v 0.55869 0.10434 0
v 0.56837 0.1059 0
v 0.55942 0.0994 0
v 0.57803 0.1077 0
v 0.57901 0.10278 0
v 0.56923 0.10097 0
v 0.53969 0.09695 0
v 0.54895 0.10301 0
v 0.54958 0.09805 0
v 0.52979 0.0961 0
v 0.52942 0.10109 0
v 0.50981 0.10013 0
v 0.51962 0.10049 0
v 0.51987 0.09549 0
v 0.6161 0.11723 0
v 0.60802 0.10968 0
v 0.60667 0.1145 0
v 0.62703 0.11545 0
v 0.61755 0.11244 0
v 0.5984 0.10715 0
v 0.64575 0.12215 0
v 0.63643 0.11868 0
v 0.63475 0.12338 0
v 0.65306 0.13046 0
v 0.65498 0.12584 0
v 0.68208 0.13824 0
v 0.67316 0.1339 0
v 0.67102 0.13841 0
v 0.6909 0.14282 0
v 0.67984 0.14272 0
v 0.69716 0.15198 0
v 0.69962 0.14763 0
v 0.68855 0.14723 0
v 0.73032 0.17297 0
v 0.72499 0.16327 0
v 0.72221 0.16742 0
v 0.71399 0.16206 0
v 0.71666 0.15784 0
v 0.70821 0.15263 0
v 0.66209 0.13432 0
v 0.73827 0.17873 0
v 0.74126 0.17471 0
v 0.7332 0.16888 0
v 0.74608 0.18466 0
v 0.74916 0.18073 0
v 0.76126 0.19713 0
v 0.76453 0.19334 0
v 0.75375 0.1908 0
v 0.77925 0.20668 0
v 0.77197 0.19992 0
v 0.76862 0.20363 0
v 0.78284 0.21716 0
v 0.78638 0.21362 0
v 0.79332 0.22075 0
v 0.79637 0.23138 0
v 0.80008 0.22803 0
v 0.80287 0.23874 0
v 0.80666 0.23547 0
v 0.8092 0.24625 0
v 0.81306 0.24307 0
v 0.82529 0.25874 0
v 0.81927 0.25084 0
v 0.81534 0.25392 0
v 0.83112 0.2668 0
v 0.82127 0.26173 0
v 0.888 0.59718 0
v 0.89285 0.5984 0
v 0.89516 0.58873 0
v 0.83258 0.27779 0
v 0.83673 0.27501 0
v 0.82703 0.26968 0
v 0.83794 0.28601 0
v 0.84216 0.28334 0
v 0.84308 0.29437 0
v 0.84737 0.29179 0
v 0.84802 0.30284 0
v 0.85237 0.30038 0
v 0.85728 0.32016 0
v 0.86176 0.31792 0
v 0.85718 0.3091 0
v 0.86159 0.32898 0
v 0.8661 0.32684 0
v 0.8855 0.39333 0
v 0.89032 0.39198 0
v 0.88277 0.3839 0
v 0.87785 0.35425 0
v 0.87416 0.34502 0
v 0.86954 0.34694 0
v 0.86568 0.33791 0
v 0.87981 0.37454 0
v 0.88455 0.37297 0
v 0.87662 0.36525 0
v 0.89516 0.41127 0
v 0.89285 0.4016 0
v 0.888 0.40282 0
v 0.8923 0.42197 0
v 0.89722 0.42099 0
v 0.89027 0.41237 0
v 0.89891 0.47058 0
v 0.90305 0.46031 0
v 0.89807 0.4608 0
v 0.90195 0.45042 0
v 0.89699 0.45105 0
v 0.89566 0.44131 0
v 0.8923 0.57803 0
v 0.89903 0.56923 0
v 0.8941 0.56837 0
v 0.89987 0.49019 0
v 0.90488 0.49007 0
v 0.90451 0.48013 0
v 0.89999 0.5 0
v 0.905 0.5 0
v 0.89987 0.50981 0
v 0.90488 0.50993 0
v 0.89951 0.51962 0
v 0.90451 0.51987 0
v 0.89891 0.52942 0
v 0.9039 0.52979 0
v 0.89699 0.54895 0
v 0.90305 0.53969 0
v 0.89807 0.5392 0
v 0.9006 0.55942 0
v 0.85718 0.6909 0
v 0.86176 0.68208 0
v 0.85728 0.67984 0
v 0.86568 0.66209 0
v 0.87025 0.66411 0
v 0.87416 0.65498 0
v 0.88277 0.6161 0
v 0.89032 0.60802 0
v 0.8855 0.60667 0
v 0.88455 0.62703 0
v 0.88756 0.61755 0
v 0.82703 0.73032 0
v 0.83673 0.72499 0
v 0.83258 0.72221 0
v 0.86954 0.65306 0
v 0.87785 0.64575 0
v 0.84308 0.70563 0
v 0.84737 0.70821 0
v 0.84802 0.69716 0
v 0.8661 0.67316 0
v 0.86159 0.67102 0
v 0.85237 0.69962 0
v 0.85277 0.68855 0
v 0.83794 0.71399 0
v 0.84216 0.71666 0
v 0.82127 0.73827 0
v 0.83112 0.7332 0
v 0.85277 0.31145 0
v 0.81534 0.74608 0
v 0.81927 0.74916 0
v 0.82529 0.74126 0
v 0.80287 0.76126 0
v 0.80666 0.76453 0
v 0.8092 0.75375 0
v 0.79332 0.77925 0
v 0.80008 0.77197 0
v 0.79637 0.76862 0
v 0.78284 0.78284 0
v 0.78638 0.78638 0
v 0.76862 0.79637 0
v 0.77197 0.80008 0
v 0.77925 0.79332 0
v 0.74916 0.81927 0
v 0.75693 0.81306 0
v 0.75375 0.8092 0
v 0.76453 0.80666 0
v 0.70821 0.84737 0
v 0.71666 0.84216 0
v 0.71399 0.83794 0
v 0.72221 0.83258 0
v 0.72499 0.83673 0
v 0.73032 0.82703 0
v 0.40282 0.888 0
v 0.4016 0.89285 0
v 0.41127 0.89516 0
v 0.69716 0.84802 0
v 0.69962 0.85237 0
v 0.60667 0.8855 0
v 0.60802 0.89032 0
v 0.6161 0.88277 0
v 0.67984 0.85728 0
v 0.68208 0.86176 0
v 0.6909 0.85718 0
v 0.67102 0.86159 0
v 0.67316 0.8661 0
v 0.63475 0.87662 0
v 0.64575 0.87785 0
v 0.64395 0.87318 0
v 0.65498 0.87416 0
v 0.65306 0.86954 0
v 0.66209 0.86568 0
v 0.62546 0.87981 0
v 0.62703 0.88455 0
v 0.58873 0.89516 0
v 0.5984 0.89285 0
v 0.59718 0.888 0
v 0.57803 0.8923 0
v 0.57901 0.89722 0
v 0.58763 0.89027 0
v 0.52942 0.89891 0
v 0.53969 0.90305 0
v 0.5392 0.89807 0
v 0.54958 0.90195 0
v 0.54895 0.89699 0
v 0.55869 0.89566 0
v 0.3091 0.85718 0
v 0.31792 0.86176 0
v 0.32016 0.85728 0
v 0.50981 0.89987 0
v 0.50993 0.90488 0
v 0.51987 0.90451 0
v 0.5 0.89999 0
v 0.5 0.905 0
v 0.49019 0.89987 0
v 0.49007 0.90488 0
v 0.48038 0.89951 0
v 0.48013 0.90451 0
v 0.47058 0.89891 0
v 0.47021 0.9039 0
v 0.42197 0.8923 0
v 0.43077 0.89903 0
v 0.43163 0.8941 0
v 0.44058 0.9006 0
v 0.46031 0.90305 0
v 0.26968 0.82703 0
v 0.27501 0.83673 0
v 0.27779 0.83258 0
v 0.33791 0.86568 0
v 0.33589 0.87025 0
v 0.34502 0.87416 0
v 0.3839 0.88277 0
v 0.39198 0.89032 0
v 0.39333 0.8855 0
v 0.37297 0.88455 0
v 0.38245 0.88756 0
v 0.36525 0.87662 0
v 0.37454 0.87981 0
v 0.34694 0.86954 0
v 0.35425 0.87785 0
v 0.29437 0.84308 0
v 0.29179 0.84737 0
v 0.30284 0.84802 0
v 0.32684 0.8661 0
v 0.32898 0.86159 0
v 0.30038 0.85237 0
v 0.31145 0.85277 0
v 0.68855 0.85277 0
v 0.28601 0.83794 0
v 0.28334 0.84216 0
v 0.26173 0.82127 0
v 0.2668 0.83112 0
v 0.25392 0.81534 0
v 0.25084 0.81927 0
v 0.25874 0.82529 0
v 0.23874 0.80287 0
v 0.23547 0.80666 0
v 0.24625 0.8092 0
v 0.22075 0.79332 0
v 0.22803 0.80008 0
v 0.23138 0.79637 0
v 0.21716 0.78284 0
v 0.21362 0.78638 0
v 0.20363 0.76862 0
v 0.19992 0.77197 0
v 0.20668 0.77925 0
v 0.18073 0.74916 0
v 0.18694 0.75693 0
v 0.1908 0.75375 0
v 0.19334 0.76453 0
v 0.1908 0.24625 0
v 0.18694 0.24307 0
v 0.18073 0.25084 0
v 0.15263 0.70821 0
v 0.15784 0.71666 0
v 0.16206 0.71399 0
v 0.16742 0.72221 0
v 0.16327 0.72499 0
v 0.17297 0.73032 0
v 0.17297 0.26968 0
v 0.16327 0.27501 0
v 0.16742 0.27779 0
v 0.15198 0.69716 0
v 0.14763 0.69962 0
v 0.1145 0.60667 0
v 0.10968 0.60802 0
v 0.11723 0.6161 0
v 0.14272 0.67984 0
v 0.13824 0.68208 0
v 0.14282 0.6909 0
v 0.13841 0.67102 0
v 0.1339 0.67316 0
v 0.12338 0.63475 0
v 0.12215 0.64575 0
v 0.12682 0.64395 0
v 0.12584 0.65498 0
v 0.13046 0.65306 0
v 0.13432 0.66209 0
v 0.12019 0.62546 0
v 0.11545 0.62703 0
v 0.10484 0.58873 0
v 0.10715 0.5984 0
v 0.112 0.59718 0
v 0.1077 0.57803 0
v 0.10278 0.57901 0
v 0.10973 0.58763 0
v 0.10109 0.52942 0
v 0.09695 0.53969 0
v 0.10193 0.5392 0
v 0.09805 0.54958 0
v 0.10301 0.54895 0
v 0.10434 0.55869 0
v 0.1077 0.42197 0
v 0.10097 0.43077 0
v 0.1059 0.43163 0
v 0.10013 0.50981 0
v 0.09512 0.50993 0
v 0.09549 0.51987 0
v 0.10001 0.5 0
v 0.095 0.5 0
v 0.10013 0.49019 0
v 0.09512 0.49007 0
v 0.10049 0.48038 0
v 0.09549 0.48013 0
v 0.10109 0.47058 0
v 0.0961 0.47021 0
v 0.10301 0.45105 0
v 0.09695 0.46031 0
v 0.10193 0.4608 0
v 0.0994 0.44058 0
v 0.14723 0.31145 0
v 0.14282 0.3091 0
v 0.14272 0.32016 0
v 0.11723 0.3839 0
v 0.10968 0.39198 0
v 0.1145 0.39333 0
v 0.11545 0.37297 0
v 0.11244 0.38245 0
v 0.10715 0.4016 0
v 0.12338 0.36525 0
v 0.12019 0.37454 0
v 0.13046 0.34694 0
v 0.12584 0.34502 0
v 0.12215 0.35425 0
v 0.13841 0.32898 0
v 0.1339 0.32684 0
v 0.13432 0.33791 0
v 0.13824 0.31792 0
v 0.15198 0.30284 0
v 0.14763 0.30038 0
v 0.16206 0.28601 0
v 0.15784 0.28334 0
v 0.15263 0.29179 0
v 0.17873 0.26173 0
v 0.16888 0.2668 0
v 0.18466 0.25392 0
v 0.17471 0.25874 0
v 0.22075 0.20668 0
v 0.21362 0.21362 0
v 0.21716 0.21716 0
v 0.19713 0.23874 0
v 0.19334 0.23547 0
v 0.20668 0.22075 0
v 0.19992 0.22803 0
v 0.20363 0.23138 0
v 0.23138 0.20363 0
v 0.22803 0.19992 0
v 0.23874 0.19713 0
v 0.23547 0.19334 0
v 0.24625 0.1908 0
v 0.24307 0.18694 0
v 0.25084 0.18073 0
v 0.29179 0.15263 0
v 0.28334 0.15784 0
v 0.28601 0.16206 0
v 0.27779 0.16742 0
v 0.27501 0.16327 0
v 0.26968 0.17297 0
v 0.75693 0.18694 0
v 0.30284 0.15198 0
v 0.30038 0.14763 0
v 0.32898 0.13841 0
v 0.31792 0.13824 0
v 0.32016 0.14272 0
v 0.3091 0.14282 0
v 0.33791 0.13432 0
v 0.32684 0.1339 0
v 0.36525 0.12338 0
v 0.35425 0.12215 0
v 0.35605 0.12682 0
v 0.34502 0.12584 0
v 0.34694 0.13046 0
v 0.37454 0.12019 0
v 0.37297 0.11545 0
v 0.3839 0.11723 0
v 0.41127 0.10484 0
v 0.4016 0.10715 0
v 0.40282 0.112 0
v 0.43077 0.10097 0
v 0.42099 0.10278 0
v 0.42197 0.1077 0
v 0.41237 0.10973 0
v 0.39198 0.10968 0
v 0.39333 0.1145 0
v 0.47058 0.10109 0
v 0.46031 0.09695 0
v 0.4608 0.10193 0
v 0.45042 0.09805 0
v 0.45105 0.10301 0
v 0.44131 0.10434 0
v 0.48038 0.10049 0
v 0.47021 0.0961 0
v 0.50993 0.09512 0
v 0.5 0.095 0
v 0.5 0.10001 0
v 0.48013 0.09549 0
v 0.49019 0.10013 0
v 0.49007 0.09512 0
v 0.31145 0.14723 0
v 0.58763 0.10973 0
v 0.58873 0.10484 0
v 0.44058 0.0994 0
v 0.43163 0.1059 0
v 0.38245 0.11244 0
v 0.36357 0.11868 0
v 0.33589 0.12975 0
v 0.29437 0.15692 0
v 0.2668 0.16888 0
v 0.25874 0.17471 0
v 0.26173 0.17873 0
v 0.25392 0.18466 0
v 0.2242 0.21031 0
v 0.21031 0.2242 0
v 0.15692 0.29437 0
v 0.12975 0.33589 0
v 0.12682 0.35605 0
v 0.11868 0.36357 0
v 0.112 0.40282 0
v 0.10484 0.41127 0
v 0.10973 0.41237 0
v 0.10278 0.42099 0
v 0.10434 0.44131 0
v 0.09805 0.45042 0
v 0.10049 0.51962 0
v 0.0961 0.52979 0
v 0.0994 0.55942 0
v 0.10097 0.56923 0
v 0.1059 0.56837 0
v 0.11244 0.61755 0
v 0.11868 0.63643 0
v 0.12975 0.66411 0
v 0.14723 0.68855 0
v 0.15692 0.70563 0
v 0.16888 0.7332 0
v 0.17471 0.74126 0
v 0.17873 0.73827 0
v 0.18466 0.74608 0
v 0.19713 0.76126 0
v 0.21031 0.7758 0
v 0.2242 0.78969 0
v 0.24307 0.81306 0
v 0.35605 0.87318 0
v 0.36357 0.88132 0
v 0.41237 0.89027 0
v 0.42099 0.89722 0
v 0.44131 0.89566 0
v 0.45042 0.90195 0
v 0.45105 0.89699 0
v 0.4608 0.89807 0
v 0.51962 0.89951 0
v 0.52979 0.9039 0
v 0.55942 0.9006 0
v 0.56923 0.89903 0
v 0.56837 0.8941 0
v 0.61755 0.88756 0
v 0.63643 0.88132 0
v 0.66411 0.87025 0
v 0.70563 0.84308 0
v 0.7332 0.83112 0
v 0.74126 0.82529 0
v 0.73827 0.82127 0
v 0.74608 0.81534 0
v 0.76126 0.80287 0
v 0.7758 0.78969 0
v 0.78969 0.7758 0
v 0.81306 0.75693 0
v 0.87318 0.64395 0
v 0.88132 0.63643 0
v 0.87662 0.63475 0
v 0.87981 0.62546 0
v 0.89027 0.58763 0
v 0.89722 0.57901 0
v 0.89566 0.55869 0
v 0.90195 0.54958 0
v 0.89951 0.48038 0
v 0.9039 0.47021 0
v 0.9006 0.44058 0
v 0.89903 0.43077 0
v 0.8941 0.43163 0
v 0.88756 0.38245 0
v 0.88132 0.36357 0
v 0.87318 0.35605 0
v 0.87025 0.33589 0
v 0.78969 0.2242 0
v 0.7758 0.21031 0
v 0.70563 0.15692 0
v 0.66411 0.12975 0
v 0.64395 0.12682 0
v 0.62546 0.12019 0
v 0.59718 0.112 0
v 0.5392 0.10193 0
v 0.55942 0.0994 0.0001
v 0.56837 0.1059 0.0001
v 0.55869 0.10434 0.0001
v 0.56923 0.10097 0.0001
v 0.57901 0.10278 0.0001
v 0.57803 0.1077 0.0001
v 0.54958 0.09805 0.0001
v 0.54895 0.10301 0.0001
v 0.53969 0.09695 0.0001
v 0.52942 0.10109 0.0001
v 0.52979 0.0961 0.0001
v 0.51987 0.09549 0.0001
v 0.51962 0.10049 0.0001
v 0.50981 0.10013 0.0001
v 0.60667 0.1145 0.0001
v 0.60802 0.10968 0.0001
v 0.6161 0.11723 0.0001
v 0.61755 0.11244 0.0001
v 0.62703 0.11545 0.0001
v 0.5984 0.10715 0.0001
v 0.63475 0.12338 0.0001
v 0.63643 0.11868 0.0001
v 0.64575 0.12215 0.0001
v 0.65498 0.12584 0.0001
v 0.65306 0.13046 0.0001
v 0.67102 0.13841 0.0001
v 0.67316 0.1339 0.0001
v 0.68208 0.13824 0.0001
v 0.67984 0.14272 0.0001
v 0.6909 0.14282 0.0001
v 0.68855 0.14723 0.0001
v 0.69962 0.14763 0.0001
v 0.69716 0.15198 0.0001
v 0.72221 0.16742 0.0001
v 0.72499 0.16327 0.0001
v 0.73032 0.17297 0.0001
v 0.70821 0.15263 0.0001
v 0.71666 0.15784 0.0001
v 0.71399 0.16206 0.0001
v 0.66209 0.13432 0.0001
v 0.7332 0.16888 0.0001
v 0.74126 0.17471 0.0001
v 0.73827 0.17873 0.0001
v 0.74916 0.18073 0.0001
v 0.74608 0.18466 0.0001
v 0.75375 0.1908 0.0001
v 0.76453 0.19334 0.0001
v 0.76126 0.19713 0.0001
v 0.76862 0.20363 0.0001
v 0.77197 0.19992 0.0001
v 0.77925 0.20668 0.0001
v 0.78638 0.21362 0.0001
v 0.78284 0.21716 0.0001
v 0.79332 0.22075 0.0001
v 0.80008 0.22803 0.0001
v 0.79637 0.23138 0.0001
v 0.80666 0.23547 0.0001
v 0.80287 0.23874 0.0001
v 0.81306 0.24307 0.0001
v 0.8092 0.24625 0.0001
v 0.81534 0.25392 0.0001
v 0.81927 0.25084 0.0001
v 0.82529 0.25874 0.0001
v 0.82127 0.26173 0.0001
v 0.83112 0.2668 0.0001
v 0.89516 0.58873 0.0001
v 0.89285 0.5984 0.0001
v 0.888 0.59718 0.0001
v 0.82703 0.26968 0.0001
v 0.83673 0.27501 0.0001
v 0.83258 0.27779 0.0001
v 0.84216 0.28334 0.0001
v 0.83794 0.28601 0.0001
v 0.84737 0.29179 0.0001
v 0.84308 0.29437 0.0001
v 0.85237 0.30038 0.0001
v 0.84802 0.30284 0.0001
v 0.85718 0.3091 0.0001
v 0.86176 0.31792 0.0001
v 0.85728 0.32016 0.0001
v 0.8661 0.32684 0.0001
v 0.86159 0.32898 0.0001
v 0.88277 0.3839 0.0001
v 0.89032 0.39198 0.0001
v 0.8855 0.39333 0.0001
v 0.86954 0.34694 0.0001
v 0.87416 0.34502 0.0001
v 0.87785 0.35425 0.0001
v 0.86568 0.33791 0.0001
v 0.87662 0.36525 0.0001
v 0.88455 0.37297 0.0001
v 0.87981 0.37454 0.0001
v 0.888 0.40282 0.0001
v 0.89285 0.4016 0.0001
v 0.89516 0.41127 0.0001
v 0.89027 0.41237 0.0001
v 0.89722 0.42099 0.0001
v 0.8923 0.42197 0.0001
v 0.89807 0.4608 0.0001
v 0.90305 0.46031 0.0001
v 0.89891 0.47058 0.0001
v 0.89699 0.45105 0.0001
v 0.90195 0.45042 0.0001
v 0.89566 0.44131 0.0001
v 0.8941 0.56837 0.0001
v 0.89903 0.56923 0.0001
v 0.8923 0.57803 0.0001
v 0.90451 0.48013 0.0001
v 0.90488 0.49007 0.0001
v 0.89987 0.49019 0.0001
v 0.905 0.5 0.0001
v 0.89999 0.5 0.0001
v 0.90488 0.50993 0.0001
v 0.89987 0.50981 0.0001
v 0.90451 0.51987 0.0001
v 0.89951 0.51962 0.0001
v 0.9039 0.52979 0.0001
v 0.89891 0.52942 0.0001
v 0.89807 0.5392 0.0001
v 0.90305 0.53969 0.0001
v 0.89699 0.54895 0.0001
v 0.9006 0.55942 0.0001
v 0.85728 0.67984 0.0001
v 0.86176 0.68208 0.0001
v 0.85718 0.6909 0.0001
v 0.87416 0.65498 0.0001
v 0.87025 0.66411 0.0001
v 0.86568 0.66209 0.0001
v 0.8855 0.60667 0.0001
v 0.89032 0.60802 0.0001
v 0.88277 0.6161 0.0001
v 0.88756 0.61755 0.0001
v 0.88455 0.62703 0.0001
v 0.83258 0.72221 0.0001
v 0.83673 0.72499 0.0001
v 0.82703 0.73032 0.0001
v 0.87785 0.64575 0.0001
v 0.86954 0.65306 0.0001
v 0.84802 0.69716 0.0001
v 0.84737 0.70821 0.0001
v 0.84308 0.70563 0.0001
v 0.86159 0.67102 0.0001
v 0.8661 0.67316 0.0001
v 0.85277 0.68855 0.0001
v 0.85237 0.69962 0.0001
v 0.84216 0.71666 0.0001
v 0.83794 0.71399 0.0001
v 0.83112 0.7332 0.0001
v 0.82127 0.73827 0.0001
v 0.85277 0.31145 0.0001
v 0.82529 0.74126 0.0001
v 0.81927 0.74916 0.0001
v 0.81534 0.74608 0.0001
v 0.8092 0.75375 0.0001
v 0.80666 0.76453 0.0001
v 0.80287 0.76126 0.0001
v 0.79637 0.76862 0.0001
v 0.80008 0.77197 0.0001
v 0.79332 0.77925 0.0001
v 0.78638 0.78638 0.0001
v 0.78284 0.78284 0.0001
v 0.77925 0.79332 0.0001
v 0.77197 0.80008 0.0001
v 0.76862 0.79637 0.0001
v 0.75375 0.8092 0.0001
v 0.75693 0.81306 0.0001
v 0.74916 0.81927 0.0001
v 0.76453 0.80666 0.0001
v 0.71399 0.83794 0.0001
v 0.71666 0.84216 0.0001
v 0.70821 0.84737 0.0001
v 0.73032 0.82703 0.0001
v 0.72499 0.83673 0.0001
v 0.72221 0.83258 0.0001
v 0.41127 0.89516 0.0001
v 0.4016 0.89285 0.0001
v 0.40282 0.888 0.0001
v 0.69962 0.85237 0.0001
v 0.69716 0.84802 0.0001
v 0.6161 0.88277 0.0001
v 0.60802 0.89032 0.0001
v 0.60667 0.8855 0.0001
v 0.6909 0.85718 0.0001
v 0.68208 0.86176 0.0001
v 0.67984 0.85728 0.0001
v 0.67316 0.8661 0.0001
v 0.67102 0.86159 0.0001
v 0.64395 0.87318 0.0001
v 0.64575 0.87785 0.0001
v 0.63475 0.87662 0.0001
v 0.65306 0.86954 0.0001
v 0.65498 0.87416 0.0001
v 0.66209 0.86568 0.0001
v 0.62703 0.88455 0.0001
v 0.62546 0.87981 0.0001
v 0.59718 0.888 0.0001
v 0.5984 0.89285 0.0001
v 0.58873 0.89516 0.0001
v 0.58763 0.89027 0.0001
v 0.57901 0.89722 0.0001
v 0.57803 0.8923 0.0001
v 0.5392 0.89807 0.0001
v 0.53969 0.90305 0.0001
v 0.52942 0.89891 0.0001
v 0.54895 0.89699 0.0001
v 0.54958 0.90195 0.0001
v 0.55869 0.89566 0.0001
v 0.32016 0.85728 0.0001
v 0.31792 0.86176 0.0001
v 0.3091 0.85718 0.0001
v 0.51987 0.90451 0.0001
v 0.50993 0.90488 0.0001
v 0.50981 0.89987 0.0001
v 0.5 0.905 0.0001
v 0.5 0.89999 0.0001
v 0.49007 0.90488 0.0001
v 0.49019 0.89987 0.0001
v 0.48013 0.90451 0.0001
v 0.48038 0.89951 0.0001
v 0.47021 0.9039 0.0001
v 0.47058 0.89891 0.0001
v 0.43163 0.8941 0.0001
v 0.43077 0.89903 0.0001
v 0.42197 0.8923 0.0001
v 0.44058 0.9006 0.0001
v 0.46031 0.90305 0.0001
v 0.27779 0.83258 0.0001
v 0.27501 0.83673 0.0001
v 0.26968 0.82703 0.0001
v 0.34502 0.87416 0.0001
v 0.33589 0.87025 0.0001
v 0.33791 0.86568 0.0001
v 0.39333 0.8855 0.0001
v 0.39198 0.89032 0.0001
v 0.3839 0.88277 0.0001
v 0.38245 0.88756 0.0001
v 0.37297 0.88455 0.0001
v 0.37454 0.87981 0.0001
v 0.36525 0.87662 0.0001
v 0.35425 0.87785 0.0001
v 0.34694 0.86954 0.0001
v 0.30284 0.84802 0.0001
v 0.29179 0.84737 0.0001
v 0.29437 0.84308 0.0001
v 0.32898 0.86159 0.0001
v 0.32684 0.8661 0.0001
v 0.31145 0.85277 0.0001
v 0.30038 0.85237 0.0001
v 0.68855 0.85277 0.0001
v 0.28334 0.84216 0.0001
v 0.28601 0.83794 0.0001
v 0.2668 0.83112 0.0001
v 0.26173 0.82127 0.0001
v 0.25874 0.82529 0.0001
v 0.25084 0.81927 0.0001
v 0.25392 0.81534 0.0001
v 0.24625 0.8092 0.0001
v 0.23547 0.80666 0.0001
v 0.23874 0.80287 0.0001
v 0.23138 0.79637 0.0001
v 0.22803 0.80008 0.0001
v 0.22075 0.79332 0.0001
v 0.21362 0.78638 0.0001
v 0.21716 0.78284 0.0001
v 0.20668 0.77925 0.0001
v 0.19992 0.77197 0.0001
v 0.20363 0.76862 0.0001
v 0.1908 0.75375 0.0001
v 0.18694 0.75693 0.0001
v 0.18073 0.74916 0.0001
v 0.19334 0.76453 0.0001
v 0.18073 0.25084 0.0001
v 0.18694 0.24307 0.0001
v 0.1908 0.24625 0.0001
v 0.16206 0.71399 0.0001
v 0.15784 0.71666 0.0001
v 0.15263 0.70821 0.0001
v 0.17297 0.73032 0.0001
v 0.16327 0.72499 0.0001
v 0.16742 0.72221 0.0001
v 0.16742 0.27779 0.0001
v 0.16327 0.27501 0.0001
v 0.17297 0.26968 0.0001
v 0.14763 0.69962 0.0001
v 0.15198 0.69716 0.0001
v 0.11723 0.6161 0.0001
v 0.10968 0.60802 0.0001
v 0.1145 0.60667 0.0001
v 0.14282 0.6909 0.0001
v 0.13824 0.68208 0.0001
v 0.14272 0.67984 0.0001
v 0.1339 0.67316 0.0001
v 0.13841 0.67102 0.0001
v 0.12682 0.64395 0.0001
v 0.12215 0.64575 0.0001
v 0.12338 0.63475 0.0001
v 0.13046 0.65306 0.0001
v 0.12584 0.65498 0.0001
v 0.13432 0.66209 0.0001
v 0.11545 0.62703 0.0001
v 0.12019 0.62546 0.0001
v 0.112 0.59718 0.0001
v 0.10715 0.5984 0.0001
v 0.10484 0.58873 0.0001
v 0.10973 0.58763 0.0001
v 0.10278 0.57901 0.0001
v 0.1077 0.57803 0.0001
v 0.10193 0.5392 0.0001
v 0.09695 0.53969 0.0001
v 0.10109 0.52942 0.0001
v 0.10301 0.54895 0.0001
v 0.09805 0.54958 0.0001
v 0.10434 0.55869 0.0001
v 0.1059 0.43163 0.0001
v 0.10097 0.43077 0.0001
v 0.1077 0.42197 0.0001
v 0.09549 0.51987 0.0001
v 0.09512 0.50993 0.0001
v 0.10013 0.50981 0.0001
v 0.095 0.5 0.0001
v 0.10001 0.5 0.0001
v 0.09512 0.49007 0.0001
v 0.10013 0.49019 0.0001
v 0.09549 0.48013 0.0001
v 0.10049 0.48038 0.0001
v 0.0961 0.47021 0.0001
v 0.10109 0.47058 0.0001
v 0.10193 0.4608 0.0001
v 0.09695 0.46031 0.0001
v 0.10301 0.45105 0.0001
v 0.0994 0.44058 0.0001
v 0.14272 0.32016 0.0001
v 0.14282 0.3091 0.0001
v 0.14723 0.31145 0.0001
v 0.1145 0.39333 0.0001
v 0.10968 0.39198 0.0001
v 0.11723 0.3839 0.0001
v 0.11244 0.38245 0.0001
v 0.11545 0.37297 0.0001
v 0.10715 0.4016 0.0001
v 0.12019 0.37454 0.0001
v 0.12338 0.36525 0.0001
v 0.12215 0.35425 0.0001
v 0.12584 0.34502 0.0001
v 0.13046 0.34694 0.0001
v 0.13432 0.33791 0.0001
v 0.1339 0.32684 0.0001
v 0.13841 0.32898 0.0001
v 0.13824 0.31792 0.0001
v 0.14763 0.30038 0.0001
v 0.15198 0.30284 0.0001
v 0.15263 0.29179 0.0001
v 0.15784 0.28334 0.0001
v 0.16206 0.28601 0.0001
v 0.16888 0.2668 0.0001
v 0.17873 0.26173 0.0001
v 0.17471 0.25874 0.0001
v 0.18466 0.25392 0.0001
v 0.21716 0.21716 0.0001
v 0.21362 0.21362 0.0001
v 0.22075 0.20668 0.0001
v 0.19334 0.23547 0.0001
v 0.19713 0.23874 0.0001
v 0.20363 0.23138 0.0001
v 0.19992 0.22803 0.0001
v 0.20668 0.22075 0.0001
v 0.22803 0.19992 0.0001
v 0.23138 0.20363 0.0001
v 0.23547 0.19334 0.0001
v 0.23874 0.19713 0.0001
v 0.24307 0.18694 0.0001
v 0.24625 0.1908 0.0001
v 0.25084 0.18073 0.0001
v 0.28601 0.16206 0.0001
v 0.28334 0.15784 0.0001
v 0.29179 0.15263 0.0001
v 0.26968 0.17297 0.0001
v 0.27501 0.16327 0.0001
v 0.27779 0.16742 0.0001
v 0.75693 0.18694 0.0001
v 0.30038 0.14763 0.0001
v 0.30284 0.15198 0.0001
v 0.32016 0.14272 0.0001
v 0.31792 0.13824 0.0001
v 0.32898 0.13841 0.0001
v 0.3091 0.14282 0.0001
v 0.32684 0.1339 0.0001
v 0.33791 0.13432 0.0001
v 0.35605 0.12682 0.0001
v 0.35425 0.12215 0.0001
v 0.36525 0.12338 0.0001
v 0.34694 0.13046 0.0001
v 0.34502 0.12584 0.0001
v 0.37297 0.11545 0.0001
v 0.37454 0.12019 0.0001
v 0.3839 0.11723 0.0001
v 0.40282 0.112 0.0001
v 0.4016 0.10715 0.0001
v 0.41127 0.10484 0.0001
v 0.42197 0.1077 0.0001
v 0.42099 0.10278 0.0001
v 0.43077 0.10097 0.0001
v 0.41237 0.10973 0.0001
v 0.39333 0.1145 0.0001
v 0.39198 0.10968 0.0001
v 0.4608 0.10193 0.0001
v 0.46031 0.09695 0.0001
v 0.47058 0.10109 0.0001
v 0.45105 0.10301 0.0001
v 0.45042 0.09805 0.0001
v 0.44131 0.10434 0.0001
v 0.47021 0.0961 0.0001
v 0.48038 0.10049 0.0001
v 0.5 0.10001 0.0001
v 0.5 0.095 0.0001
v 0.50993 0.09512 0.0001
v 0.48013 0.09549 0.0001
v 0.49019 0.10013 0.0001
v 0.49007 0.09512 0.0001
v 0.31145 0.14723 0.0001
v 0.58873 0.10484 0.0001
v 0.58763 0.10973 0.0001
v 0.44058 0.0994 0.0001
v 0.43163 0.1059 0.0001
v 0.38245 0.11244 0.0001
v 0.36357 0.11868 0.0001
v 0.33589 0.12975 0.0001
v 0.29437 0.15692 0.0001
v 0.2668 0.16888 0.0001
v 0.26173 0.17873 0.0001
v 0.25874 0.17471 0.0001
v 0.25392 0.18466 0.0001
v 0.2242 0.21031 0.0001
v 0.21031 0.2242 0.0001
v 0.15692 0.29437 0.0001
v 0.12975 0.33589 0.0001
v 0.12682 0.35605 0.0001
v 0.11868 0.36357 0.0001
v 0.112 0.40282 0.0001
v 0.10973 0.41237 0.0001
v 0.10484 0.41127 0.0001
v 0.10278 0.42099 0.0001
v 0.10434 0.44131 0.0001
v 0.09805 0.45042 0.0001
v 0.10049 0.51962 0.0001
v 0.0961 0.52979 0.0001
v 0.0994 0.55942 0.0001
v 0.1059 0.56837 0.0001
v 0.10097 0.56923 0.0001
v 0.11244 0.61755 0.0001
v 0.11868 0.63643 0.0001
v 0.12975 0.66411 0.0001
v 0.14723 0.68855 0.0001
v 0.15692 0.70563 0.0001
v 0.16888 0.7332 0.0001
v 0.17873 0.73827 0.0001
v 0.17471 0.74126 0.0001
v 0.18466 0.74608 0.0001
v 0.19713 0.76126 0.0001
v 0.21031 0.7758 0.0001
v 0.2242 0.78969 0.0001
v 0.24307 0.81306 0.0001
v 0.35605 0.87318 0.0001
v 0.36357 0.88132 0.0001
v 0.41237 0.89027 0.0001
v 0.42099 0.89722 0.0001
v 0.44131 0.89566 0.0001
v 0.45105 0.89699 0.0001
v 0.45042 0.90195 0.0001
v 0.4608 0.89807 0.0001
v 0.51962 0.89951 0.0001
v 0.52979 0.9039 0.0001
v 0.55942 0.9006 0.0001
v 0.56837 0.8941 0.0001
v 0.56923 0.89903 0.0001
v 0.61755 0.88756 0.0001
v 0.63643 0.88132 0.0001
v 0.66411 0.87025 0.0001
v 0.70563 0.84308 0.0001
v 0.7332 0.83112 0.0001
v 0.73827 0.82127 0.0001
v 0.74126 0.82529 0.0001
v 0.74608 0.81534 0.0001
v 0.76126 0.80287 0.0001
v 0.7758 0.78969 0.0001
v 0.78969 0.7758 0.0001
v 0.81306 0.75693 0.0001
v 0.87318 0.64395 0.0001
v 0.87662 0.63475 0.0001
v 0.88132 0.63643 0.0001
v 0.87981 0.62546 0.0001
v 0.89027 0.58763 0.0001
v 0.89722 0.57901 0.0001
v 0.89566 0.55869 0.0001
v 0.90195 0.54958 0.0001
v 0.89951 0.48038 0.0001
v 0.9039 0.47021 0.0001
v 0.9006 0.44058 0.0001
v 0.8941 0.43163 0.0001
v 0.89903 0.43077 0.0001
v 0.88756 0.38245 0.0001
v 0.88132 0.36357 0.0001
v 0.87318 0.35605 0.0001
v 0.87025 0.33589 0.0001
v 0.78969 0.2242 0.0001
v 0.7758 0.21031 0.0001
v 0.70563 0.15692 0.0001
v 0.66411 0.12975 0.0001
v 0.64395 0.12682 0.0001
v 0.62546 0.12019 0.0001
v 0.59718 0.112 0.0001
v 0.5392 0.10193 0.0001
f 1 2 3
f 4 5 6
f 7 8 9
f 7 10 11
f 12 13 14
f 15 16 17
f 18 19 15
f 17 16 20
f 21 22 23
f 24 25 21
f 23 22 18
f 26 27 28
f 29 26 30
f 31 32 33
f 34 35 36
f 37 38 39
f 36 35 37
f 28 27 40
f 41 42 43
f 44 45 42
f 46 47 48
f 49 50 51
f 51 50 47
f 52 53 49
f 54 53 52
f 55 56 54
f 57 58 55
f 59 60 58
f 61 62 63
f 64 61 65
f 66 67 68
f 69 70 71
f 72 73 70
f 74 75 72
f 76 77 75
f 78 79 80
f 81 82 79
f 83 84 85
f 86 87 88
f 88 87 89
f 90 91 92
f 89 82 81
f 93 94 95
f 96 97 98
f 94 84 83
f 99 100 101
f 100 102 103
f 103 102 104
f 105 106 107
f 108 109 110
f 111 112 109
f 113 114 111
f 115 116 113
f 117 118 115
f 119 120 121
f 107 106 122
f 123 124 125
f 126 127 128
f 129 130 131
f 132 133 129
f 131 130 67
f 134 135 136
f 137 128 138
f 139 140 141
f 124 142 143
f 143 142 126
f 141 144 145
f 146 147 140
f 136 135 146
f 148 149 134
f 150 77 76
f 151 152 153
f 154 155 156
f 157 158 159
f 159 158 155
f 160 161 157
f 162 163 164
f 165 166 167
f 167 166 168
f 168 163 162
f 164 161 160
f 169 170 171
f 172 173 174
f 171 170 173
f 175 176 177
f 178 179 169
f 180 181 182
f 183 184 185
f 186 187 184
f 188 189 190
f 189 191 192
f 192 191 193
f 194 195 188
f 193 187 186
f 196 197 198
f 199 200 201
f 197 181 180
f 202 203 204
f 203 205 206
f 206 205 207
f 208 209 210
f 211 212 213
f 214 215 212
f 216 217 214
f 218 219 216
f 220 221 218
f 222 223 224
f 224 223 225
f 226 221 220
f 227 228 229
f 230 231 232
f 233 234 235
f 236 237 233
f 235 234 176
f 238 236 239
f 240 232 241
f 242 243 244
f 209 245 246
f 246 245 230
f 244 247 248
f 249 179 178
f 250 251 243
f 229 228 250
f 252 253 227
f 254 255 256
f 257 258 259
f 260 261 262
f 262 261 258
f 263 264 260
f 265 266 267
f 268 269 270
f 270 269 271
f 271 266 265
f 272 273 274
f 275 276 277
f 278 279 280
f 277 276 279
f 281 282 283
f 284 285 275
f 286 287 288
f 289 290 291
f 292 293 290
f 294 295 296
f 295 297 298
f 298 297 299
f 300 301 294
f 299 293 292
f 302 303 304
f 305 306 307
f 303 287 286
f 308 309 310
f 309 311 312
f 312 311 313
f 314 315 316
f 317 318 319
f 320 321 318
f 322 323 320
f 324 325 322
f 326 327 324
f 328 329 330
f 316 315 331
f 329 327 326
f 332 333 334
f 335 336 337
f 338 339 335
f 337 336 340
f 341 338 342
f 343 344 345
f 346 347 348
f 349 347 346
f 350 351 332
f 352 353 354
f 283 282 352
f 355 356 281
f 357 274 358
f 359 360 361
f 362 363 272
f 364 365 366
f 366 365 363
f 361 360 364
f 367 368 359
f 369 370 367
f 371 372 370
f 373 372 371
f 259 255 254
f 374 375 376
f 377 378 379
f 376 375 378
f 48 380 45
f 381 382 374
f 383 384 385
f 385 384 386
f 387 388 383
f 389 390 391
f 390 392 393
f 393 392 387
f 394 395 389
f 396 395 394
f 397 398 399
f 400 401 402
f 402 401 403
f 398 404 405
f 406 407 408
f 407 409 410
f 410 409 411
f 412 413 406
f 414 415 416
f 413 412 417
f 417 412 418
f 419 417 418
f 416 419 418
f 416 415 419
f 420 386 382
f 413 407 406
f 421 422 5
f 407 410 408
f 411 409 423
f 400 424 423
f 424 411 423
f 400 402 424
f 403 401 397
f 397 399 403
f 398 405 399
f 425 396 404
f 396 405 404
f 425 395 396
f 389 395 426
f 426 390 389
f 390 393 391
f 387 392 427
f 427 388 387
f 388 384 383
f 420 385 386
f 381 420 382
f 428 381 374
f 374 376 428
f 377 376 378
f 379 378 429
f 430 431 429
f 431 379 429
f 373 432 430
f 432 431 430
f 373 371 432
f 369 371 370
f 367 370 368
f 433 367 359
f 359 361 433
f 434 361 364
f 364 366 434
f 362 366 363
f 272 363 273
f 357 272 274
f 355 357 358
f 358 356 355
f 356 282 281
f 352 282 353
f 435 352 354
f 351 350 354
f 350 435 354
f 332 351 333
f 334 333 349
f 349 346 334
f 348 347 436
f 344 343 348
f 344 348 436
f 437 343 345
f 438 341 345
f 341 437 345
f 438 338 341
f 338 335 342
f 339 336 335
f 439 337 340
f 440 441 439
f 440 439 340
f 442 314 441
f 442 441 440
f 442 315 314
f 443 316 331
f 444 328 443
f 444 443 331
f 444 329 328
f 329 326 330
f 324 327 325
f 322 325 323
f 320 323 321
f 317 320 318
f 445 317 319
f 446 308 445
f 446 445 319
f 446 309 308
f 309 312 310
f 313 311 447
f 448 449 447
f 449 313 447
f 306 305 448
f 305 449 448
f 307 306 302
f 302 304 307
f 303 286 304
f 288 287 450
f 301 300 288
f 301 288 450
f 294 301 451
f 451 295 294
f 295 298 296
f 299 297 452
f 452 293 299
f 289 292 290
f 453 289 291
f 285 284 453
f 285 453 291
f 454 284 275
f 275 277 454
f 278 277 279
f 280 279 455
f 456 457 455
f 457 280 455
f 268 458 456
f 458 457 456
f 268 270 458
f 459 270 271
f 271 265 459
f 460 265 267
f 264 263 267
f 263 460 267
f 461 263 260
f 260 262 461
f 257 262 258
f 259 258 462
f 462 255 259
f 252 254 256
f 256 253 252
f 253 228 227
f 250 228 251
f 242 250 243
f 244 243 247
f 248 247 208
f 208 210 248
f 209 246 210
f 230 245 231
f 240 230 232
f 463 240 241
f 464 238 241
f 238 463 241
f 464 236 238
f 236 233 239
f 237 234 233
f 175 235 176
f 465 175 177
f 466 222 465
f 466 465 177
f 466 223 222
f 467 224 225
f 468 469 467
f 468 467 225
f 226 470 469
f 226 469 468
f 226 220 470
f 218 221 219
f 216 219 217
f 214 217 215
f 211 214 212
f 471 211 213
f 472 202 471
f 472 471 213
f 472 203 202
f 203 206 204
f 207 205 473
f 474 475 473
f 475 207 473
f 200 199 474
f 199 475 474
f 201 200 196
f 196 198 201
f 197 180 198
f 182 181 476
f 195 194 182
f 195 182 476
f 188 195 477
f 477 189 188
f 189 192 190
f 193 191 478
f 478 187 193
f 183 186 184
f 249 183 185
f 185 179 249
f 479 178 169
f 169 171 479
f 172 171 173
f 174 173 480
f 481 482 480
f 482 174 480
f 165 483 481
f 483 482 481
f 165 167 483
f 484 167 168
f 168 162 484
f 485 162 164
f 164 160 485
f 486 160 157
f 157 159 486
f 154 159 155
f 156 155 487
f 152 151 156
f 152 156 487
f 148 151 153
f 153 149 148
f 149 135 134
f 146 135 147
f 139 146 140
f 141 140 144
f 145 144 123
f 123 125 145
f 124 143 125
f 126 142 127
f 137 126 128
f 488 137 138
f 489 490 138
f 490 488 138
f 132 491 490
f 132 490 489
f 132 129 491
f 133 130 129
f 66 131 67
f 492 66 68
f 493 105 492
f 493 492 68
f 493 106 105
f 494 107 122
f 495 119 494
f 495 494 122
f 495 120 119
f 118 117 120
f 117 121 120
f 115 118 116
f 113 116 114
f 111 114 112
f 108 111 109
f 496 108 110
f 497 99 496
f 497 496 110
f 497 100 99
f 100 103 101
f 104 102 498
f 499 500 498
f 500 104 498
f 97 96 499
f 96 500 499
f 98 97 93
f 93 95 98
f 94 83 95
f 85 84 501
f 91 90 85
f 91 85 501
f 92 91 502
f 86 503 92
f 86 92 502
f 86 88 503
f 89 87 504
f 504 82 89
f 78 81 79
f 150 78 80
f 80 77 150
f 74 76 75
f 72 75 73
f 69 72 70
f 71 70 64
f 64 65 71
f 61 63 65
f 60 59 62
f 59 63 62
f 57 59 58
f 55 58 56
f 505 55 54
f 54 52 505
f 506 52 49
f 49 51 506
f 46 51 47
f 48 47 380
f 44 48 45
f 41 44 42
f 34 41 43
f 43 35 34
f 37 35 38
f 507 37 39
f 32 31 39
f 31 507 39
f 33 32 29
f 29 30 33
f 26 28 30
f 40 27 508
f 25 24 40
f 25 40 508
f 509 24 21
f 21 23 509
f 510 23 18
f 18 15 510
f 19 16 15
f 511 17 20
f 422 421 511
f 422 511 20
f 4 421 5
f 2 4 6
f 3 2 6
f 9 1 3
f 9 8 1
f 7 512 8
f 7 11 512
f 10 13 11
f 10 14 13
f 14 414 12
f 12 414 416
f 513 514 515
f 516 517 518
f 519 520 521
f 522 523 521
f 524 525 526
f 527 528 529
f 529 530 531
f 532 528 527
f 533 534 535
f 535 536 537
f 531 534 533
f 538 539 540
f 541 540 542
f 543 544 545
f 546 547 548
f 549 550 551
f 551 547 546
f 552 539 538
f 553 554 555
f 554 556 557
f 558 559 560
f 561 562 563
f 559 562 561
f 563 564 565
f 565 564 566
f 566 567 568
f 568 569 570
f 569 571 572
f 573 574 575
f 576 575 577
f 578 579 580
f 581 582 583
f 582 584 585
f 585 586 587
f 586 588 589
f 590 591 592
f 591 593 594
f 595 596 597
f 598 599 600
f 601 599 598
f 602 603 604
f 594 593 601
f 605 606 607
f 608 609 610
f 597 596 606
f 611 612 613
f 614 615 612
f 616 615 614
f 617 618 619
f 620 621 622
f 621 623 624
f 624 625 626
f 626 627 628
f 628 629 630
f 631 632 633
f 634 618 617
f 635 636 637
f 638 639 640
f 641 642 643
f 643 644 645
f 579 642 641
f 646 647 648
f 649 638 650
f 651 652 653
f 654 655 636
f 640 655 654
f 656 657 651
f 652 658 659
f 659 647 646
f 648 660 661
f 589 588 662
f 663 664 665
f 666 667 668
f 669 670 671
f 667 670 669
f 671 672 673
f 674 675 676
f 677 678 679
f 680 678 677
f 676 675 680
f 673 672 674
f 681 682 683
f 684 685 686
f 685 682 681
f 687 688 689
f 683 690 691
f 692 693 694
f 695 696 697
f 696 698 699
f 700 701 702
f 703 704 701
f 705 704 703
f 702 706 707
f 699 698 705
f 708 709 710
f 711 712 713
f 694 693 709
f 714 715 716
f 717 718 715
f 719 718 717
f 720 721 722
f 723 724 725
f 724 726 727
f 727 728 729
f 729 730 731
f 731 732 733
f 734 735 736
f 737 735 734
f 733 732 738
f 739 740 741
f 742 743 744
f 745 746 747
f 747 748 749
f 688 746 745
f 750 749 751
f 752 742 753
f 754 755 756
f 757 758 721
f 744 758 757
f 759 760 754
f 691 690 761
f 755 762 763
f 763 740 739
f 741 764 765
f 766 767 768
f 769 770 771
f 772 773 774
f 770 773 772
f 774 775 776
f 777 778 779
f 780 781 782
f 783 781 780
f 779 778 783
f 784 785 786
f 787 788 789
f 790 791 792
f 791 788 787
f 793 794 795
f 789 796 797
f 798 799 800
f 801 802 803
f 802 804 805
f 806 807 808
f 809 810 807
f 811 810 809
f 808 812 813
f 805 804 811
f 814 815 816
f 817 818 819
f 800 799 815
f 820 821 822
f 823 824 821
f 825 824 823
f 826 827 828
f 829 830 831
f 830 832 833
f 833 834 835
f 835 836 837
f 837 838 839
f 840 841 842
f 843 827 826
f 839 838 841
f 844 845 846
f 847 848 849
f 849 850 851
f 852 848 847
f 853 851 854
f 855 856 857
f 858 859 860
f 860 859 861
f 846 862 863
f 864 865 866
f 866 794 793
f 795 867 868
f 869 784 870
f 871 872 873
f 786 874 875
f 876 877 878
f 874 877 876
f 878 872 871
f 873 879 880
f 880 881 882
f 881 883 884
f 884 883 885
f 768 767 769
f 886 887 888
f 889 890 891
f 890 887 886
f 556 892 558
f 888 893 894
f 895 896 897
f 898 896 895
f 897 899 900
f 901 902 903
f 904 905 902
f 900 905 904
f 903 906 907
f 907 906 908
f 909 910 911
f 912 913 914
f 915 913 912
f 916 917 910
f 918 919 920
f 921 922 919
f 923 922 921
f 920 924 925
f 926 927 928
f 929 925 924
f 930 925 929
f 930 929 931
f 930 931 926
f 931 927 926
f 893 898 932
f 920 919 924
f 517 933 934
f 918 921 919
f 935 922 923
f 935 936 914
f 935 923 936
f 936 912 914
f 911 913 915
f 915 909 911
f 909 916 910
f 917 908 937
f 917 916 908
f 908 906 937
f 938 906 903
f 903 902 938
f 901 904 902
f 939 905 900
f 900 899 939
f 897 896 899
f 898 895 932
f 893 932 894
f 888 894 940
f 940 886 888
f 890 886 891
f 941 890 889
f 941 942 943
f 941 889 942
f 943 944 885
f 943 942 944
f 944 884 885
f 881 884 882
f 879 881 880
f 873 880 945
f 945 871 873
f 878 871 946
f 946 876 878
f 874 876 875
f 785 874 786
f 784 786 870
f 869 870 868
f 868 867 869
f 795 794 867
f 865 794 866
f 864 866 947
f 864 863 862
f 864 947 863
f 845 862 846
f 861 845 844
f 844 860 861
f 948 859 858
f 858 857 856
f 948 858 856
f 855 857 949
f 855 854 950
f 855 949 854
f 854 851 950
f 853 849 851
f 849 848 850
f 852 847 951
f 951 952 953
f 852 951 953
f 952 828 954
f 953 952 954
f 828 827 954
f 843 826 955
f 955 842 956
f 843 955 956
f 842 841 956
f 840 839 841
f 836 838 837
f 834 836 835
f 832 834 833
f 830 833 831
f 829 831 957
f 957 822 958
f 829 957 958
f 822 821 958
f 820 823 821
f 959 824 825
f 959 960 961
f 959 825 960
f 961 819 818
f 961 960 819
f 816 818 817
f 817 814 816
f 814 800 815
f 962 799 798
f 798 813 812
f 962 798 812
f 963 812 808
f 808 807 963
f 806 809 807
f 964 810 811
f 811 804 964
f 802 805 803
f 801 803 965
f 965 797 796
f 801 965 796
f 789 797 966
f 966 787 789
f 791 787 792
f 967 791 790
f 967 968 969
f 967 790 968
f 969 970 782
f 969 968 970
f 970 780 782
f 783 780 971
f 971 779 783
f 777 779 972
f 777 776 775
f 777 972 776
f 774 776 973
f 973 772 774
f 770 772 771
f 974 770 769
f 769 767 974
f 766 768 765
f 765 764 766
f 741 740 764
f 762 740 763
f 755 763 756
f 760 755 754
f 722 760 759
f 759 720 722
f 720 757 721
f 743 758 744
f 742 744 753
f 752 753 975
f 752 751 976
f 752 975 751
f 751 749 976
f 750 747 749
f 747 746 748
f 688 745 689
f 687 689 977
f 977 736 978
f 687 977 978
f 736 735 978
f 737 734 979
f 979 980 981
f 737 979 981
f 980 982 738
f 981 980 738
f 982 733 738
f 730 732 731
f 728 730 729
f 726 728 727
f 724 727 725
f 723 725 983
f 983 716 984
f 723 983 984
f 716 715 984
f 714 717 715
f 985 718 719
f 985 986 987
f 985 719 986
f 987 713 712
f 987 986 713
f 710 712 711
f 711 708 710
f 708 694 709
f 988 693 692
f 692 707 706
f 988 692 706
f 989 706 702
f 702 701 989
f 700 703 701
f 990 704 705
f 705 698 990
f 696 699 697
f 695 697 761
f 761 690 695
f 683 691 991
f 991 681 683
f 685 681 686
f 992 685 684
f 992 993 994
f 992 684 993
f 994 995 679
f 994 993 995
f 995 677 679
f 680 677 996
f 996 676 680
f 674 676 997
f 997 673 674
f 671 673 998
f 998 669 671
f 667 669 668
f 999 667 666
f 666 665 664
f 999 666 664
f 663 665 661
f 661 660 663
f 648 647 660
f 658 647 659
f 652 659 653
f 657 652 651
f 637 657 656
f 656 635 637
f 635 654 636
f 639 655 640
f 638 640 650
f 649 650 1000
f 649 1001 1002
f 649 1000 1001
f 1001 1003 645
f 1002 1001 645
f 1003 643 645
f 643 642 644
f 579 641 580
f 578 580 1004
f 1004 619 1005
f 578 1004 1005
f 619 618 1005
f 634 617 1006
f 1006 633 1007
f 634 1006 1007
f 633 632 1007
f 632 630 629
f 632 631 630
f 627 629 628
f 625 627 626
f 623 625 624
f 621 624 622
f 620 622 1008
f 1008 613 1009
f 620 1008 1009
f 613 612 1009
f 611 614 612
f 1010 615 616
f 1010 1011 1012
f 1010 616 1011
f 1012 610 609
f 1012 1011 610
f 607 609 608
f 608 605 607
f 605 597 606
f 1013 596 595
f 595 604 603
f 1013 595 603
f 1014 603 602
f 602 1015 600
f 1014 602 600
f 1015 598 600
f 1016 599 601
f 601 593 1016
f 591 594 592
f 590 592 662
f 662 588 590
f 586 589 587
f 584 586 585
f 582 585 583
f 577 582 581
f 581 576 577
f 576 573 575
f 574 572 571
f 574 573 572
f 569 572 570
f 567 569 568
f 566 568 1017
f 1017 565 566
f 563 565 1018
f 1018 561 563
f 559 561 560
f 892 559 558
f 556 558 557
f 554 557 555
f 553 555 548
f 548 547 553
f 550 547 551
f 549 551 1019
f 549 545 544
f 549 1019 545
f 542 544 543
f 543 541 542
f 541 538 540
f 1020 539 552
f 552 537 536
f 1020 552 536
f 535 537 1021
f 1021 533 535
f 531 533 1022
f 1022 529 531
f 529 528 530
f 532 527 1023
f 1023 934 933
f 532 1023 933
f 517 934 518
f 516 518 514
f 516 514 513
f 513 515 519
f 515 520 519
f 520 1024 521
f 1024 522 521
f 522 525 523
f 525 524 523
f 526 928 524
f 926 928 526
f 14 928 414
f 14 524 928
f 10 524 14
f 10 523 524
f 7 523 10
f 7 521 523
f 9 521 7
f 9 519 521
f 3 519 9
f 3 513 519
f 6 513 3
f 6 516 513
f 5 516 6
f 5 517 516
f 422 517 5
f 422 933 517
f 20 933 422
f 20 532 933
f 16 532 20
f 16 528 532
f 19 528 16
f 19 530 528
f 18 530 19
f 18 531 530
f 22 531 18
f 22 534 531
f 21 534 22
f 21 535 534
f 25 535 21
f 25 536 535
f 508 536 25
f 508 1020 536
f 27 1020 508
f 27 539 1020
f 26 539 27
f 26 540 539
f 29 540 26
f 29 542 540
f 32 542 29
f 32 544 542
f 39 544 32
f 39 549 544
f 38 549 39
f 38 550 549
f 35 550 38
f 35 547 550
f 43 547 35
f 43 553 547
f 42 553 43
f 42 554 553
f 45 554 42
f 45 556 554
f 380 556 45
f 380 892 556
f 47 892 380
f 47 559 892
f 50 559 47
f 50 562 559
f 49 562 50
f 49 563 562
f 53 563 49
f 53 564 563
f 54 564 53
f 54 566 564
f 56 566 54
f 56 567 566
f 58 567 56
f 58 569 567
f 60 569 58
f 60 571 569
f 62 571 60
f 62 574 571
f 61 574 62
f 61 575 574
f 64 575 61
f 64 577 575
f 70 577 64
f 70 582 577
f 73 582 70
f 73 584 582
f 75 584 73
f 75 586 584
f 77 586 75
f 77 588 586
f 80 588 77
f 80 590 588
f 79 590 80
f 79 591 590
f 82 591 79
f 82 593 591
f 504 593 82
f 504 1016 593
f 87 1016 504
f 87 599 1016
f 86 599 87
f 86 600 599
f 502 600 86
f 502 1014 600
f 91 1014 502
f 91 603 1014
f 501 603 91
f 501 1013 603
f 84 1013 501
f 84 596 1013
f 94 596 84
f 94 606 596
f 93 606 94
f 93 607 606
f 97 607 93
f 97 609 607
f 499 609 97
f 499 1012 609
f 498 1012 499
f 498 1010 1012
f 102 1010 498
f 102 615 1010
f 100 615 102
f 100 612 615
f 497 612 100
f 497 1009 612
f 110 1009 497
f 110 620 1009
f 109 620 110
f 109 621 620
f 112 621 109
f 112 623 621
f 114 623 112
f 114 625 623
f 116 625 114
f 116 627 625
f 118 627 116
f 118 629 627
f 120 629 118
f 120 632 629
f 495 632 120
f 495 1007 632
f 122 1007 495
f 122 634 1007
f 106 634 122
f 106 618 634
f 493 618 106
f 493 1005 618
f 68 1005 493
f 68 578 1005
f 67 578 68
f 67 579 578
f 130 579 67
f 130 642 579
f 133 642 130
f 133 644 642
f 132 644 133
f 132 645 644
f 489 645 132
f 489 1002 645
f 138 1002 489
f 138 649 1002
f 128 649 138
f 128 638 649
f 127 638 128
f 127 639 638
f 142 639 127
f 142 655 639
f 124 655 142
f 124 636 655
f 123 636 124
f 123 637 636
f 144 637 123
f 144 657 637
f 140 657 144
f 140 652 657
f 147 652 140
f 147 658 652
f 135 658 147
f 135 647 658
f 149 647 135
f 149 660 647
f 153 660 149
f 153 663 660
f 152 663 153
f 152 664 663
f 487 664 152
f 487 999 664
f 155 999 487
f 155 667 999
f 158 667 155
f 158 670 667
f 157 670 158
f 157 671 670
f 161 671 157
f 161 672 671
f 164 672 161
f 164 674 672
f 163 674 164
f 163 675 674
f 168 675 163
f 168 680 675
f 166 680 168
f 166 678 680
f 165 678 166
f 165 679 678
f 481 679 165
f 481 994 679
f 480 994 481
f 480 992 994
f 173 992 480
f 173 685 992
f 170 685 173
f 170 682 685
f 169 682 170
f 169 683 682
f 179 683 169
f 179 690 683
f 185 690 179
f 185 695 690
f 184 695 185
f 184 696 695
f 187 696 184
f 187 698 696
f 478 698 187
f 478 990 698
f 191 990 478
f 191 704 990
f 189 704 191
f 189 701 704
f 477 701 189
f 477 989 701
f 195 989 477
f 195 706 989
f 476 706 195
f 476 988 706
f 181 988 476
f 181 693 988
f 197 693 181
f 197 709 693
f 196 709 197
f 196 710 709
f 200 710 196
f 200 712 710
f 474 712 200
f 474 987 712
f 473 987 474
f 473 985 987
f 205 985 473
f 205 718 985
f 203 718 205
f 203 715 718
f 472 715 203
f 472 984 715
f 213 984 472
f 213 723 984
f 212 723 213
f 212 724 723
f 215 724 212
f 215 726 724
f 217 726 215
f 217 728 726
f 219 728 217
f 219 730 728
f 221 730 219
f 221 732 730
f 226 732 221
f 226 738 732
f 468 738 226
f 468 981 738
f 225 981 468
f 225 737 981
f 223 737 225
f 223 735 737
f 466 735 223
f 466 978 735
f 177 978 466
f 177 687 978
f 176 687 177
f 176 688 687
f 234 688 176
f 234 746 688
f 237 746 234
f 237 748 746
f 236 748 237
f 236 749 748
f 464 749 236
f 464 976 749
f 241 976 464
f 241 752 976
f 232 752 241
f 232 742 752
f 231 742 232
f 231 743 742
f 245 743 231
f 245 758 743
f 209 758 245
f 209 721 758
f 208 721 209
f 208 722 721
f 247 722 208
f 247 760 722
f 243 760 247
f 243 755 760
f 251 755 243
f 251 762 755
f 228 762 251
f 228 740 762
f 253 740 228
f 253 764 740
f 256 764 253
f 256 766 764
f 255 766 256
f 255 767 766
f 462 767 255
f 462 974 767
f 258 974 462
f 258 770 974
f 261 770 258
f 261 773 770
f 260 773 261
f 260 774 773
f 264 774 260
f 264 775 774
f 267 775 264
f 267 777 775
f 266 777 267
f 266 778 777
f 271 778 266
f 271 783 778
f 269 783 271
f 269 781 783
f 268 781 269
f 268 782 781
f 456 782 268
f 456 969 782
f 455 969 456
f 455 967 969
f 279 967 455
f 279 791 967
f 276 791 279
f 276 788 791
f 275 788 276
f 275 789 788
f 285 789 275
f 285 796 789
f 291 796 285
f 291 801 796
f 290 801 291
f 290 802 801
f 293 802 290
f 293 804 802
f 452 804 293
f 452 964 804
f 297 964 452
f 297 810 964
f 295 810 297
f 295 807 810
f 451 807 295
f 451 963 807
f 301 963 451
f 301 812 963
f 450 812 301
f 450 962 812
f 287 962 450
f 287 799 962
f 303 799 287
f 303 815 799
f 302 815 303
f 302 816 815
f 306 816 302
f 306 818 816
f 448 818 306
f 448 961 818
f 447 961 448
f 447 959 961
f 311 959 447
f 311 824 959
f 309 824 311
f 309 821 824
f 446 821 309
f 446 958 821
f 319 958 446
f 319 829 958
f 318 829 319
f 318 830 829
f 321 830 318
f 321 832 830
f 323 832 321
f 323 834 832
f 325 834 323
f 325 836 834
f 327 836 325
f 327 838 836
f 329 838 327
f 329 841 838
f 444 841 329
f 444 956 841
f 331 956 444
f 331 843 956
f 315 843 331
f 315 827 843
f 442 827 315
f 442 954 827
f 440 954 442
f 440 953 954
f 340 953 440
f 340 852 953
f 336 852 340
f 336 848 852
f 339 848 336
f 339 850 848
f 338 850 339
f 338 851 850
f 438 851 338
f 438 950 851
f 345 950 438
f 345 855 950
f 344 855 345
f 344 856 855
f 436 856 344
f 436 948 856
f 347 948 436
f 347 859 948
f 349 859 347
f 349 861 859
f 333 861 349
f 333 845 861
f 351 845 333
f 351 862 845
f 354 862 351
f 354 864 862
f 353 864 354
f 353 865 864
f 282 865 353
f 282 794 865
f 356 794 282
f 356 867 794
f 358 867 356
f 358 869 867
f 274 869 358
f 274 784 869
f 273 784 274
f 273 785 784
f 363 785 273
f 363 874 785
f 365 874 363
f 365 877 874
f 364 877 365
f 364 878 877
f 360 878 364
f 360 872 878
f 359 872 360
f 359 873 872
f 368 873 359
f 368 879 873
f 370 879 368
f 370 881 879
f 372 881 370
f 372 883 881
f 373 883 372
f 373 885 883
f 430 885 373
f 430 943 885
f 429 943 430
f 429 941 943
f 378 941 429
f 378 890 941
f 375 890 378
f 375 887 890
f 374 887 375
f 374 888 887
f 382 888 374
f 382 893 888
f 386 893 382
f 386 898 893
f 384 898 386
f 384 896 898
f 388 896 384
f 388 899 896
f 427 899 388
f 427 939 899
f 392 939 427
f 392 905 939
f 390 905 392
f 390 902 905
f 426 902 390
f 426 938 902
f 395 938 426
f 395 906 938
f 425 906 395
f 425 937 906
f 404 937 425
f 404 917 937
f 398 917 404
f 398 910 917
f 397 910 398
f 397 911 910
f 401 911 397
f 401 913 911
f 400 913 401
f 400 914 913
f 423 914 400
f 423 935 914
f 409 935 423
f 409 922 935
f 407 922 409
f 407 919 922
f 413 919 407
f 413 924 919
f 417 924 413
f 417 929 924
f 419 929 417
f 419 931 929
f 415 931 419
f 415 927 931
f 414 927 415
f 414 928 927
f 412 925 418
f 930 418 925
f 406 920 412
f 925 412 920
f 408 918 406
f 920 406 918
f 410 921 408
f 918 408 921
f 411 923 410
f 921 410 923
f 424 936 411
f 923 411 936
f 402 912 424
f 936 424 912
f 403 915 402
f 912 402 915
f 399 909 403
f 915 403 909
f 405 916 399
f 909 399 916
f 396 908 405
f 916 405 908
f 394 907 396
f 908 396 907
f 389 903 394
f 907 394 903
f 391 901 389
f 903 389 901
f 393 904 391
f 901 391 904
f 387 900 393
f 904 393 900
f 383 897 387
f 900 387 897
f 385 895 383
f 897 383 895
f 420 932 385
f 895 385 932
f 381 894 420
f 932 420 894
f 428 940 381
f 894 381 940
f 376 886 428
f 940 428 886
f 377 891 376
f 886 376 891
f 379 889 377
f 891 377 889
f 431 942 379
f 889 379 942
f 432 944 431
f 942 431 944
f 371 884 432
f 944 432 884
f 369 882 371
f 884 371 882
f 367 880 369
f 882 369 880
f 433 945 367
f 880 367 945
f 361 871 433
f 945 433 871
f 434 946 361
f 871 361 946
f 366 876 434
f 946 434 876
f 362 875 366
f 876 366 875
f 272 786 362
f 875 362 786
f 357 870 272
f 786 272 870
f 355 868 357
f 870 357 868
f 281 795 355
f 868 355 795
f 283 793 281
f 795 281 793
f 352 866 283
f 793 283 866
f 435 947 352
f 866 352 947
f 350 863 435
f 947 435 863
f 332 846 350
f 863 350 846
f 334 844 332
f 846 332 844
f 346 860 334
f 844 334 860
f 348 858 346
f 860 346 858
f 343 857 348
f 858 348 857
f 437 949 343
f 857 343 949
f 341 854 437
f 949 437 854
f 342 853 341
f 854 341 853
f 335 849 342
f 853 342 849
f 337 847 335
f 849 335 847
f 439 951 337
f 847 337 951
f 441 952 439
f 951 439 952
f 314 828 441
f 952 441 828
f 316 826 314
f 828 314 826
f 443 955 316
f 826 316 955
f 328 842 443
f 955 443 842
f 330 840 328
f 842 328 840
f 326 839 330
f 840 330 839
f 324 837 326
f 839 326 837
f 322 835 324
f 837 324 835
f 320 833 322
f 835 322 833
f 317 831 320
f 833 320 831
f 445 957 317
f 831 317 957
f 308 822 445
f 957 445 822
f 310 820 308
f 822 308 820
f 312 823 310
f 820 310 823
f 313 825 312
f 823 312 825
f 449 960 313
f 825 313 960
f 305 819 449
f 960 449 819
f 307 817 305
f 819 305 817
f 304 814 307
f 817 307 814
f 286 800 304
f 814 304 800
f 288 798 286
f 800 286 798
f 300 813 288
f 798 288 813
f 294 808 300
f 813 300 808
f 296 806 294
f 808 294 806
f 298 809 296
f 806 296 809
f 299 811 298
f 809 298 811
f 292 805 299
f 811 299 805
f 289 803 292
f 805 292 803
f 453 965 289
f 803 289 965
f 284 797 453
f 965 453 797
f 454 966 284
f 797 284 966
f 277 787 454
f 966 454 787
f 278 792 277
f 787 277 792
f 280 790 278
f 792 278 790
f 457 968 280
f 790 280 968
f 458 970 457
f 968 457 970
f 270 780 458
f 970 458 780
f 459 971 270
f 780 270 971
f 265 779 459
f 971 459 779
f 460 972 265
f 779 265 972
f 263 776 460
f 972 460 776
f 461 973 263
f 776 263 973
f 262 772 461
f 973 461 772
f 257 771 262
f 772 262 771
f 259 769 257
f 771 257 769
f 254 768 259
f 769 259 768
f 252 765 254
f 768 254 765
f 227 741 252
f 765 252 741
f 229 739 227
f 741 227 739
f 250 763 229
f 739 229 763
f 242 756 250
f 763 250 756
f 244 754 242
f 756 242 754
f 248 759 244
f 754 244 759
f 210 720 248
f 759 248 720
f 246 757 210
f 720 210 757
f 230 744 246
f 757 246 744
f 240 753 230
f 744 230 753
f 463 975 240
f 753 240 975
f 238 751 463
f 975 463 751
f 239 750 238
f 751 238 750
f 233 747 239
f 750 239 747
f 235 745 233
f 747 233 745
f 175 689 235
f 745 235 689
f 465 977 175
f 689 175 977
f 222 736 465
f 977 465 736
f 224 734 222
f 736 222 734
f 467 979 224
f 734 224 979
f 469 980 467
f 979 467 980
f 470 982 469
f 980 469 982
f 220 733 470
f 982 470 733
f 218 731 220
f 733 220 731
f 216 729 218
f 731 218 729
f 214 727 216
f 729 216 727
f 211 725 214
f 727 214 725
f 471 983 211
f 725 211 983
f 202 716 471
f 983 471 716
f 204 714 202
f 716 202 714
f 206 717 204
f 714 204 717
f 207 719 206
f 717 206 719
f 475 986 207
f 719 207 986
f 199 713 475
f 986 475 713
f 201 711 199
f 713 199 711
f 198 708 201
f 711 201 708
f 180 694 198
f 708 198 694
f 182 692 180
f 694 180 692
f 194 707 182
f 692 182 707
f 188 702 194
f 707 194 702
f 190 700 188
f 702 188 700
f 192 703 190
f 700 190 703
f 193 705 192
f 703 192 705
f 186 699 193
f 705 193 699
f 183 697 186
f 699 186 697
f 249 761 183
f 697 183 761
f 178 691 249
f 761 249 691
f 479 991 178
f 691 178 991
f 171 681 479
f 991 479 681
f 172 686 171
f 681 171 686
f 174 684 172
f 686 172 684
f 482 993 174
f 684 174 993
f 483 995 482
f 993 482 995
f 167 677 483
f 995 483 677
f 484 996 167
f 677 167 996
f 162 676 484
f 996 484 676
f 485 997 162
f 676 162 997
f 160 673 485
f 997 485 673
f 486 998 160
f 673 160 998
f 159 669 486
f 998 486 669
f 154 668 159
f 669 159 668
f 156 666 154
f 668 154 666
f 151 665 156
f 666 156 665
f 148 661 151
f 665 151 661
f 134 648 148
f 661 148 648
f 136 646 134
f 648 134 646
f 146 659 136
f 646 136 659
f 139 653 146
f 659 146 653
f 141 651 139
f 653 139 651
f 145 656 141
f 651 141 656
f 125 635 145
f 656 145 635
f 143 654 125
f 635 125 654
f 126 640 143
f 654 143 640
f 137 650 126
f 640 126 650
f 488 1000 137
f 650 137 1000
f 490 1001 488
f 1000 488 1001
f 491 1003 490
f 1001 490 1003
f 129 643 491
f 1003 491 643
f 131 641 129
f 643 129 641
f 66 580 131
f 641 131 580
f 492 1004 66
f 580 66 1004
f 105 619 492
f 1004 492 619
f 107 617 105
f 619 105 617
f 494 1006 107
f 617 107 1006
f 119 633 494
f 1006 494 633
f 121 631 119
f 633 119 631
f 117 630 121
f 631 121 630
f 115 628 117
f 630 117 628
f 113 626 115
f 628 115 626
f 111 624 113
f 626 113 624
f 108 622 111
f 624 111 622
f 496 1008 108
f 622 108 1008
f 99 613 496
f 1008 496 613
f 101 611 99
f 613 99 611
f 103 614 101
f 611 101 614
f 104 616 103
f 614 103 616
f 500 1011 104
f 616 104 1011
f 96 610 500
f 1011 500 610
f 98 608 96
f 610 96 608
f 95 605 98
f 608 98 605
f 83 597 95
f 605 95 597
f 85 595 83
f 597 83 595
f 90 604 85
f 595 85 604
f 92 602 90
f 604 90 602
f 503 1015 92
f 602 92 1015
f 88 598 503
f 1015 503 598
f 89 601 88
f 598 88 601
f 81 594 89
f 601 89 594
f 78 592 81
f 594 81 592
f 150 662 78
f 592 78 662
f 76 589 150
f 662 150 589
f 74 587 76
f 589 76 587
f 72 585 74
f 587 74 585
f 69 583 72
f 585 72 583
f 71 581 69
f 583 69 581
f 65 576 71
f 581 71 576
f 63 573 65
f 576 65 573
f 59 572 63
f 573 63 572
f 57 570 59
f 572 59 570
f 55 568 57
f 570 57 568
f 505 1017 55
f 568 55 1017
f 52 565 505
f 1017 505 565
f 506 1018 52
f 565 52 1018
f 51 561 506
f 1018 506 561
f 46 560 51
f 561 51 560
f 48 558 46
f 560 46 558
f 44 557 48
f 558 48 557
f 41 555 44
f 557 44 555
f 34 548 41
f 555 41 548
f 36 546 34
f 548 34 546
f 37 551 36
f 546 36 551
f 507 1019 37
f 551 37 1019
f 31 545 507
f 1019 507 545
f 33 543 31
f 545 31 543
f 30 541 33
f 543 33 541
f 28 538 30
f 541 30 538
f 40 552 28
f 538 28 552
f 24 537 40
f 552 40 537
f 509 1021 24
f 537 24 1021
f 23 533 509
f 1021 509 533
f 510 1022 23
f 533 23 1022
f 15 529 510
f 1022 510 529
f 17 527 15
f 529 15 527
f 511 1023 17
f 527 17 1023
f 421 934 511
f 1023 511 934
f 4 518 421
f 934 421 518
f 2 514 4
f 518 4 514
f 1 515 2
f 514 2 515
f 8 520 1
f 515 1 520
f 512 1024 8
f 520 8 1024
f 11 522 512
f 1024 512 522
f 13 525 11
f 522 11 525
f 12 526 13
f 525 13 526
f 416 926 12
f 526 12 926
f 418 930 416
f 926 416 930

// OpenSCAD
$fn = 256;

linear_extrude(0.0001)
translate([0.5, 0.5])
difference()
{
    circle(d = 0.81);
    circle(d = 0.8);
}
